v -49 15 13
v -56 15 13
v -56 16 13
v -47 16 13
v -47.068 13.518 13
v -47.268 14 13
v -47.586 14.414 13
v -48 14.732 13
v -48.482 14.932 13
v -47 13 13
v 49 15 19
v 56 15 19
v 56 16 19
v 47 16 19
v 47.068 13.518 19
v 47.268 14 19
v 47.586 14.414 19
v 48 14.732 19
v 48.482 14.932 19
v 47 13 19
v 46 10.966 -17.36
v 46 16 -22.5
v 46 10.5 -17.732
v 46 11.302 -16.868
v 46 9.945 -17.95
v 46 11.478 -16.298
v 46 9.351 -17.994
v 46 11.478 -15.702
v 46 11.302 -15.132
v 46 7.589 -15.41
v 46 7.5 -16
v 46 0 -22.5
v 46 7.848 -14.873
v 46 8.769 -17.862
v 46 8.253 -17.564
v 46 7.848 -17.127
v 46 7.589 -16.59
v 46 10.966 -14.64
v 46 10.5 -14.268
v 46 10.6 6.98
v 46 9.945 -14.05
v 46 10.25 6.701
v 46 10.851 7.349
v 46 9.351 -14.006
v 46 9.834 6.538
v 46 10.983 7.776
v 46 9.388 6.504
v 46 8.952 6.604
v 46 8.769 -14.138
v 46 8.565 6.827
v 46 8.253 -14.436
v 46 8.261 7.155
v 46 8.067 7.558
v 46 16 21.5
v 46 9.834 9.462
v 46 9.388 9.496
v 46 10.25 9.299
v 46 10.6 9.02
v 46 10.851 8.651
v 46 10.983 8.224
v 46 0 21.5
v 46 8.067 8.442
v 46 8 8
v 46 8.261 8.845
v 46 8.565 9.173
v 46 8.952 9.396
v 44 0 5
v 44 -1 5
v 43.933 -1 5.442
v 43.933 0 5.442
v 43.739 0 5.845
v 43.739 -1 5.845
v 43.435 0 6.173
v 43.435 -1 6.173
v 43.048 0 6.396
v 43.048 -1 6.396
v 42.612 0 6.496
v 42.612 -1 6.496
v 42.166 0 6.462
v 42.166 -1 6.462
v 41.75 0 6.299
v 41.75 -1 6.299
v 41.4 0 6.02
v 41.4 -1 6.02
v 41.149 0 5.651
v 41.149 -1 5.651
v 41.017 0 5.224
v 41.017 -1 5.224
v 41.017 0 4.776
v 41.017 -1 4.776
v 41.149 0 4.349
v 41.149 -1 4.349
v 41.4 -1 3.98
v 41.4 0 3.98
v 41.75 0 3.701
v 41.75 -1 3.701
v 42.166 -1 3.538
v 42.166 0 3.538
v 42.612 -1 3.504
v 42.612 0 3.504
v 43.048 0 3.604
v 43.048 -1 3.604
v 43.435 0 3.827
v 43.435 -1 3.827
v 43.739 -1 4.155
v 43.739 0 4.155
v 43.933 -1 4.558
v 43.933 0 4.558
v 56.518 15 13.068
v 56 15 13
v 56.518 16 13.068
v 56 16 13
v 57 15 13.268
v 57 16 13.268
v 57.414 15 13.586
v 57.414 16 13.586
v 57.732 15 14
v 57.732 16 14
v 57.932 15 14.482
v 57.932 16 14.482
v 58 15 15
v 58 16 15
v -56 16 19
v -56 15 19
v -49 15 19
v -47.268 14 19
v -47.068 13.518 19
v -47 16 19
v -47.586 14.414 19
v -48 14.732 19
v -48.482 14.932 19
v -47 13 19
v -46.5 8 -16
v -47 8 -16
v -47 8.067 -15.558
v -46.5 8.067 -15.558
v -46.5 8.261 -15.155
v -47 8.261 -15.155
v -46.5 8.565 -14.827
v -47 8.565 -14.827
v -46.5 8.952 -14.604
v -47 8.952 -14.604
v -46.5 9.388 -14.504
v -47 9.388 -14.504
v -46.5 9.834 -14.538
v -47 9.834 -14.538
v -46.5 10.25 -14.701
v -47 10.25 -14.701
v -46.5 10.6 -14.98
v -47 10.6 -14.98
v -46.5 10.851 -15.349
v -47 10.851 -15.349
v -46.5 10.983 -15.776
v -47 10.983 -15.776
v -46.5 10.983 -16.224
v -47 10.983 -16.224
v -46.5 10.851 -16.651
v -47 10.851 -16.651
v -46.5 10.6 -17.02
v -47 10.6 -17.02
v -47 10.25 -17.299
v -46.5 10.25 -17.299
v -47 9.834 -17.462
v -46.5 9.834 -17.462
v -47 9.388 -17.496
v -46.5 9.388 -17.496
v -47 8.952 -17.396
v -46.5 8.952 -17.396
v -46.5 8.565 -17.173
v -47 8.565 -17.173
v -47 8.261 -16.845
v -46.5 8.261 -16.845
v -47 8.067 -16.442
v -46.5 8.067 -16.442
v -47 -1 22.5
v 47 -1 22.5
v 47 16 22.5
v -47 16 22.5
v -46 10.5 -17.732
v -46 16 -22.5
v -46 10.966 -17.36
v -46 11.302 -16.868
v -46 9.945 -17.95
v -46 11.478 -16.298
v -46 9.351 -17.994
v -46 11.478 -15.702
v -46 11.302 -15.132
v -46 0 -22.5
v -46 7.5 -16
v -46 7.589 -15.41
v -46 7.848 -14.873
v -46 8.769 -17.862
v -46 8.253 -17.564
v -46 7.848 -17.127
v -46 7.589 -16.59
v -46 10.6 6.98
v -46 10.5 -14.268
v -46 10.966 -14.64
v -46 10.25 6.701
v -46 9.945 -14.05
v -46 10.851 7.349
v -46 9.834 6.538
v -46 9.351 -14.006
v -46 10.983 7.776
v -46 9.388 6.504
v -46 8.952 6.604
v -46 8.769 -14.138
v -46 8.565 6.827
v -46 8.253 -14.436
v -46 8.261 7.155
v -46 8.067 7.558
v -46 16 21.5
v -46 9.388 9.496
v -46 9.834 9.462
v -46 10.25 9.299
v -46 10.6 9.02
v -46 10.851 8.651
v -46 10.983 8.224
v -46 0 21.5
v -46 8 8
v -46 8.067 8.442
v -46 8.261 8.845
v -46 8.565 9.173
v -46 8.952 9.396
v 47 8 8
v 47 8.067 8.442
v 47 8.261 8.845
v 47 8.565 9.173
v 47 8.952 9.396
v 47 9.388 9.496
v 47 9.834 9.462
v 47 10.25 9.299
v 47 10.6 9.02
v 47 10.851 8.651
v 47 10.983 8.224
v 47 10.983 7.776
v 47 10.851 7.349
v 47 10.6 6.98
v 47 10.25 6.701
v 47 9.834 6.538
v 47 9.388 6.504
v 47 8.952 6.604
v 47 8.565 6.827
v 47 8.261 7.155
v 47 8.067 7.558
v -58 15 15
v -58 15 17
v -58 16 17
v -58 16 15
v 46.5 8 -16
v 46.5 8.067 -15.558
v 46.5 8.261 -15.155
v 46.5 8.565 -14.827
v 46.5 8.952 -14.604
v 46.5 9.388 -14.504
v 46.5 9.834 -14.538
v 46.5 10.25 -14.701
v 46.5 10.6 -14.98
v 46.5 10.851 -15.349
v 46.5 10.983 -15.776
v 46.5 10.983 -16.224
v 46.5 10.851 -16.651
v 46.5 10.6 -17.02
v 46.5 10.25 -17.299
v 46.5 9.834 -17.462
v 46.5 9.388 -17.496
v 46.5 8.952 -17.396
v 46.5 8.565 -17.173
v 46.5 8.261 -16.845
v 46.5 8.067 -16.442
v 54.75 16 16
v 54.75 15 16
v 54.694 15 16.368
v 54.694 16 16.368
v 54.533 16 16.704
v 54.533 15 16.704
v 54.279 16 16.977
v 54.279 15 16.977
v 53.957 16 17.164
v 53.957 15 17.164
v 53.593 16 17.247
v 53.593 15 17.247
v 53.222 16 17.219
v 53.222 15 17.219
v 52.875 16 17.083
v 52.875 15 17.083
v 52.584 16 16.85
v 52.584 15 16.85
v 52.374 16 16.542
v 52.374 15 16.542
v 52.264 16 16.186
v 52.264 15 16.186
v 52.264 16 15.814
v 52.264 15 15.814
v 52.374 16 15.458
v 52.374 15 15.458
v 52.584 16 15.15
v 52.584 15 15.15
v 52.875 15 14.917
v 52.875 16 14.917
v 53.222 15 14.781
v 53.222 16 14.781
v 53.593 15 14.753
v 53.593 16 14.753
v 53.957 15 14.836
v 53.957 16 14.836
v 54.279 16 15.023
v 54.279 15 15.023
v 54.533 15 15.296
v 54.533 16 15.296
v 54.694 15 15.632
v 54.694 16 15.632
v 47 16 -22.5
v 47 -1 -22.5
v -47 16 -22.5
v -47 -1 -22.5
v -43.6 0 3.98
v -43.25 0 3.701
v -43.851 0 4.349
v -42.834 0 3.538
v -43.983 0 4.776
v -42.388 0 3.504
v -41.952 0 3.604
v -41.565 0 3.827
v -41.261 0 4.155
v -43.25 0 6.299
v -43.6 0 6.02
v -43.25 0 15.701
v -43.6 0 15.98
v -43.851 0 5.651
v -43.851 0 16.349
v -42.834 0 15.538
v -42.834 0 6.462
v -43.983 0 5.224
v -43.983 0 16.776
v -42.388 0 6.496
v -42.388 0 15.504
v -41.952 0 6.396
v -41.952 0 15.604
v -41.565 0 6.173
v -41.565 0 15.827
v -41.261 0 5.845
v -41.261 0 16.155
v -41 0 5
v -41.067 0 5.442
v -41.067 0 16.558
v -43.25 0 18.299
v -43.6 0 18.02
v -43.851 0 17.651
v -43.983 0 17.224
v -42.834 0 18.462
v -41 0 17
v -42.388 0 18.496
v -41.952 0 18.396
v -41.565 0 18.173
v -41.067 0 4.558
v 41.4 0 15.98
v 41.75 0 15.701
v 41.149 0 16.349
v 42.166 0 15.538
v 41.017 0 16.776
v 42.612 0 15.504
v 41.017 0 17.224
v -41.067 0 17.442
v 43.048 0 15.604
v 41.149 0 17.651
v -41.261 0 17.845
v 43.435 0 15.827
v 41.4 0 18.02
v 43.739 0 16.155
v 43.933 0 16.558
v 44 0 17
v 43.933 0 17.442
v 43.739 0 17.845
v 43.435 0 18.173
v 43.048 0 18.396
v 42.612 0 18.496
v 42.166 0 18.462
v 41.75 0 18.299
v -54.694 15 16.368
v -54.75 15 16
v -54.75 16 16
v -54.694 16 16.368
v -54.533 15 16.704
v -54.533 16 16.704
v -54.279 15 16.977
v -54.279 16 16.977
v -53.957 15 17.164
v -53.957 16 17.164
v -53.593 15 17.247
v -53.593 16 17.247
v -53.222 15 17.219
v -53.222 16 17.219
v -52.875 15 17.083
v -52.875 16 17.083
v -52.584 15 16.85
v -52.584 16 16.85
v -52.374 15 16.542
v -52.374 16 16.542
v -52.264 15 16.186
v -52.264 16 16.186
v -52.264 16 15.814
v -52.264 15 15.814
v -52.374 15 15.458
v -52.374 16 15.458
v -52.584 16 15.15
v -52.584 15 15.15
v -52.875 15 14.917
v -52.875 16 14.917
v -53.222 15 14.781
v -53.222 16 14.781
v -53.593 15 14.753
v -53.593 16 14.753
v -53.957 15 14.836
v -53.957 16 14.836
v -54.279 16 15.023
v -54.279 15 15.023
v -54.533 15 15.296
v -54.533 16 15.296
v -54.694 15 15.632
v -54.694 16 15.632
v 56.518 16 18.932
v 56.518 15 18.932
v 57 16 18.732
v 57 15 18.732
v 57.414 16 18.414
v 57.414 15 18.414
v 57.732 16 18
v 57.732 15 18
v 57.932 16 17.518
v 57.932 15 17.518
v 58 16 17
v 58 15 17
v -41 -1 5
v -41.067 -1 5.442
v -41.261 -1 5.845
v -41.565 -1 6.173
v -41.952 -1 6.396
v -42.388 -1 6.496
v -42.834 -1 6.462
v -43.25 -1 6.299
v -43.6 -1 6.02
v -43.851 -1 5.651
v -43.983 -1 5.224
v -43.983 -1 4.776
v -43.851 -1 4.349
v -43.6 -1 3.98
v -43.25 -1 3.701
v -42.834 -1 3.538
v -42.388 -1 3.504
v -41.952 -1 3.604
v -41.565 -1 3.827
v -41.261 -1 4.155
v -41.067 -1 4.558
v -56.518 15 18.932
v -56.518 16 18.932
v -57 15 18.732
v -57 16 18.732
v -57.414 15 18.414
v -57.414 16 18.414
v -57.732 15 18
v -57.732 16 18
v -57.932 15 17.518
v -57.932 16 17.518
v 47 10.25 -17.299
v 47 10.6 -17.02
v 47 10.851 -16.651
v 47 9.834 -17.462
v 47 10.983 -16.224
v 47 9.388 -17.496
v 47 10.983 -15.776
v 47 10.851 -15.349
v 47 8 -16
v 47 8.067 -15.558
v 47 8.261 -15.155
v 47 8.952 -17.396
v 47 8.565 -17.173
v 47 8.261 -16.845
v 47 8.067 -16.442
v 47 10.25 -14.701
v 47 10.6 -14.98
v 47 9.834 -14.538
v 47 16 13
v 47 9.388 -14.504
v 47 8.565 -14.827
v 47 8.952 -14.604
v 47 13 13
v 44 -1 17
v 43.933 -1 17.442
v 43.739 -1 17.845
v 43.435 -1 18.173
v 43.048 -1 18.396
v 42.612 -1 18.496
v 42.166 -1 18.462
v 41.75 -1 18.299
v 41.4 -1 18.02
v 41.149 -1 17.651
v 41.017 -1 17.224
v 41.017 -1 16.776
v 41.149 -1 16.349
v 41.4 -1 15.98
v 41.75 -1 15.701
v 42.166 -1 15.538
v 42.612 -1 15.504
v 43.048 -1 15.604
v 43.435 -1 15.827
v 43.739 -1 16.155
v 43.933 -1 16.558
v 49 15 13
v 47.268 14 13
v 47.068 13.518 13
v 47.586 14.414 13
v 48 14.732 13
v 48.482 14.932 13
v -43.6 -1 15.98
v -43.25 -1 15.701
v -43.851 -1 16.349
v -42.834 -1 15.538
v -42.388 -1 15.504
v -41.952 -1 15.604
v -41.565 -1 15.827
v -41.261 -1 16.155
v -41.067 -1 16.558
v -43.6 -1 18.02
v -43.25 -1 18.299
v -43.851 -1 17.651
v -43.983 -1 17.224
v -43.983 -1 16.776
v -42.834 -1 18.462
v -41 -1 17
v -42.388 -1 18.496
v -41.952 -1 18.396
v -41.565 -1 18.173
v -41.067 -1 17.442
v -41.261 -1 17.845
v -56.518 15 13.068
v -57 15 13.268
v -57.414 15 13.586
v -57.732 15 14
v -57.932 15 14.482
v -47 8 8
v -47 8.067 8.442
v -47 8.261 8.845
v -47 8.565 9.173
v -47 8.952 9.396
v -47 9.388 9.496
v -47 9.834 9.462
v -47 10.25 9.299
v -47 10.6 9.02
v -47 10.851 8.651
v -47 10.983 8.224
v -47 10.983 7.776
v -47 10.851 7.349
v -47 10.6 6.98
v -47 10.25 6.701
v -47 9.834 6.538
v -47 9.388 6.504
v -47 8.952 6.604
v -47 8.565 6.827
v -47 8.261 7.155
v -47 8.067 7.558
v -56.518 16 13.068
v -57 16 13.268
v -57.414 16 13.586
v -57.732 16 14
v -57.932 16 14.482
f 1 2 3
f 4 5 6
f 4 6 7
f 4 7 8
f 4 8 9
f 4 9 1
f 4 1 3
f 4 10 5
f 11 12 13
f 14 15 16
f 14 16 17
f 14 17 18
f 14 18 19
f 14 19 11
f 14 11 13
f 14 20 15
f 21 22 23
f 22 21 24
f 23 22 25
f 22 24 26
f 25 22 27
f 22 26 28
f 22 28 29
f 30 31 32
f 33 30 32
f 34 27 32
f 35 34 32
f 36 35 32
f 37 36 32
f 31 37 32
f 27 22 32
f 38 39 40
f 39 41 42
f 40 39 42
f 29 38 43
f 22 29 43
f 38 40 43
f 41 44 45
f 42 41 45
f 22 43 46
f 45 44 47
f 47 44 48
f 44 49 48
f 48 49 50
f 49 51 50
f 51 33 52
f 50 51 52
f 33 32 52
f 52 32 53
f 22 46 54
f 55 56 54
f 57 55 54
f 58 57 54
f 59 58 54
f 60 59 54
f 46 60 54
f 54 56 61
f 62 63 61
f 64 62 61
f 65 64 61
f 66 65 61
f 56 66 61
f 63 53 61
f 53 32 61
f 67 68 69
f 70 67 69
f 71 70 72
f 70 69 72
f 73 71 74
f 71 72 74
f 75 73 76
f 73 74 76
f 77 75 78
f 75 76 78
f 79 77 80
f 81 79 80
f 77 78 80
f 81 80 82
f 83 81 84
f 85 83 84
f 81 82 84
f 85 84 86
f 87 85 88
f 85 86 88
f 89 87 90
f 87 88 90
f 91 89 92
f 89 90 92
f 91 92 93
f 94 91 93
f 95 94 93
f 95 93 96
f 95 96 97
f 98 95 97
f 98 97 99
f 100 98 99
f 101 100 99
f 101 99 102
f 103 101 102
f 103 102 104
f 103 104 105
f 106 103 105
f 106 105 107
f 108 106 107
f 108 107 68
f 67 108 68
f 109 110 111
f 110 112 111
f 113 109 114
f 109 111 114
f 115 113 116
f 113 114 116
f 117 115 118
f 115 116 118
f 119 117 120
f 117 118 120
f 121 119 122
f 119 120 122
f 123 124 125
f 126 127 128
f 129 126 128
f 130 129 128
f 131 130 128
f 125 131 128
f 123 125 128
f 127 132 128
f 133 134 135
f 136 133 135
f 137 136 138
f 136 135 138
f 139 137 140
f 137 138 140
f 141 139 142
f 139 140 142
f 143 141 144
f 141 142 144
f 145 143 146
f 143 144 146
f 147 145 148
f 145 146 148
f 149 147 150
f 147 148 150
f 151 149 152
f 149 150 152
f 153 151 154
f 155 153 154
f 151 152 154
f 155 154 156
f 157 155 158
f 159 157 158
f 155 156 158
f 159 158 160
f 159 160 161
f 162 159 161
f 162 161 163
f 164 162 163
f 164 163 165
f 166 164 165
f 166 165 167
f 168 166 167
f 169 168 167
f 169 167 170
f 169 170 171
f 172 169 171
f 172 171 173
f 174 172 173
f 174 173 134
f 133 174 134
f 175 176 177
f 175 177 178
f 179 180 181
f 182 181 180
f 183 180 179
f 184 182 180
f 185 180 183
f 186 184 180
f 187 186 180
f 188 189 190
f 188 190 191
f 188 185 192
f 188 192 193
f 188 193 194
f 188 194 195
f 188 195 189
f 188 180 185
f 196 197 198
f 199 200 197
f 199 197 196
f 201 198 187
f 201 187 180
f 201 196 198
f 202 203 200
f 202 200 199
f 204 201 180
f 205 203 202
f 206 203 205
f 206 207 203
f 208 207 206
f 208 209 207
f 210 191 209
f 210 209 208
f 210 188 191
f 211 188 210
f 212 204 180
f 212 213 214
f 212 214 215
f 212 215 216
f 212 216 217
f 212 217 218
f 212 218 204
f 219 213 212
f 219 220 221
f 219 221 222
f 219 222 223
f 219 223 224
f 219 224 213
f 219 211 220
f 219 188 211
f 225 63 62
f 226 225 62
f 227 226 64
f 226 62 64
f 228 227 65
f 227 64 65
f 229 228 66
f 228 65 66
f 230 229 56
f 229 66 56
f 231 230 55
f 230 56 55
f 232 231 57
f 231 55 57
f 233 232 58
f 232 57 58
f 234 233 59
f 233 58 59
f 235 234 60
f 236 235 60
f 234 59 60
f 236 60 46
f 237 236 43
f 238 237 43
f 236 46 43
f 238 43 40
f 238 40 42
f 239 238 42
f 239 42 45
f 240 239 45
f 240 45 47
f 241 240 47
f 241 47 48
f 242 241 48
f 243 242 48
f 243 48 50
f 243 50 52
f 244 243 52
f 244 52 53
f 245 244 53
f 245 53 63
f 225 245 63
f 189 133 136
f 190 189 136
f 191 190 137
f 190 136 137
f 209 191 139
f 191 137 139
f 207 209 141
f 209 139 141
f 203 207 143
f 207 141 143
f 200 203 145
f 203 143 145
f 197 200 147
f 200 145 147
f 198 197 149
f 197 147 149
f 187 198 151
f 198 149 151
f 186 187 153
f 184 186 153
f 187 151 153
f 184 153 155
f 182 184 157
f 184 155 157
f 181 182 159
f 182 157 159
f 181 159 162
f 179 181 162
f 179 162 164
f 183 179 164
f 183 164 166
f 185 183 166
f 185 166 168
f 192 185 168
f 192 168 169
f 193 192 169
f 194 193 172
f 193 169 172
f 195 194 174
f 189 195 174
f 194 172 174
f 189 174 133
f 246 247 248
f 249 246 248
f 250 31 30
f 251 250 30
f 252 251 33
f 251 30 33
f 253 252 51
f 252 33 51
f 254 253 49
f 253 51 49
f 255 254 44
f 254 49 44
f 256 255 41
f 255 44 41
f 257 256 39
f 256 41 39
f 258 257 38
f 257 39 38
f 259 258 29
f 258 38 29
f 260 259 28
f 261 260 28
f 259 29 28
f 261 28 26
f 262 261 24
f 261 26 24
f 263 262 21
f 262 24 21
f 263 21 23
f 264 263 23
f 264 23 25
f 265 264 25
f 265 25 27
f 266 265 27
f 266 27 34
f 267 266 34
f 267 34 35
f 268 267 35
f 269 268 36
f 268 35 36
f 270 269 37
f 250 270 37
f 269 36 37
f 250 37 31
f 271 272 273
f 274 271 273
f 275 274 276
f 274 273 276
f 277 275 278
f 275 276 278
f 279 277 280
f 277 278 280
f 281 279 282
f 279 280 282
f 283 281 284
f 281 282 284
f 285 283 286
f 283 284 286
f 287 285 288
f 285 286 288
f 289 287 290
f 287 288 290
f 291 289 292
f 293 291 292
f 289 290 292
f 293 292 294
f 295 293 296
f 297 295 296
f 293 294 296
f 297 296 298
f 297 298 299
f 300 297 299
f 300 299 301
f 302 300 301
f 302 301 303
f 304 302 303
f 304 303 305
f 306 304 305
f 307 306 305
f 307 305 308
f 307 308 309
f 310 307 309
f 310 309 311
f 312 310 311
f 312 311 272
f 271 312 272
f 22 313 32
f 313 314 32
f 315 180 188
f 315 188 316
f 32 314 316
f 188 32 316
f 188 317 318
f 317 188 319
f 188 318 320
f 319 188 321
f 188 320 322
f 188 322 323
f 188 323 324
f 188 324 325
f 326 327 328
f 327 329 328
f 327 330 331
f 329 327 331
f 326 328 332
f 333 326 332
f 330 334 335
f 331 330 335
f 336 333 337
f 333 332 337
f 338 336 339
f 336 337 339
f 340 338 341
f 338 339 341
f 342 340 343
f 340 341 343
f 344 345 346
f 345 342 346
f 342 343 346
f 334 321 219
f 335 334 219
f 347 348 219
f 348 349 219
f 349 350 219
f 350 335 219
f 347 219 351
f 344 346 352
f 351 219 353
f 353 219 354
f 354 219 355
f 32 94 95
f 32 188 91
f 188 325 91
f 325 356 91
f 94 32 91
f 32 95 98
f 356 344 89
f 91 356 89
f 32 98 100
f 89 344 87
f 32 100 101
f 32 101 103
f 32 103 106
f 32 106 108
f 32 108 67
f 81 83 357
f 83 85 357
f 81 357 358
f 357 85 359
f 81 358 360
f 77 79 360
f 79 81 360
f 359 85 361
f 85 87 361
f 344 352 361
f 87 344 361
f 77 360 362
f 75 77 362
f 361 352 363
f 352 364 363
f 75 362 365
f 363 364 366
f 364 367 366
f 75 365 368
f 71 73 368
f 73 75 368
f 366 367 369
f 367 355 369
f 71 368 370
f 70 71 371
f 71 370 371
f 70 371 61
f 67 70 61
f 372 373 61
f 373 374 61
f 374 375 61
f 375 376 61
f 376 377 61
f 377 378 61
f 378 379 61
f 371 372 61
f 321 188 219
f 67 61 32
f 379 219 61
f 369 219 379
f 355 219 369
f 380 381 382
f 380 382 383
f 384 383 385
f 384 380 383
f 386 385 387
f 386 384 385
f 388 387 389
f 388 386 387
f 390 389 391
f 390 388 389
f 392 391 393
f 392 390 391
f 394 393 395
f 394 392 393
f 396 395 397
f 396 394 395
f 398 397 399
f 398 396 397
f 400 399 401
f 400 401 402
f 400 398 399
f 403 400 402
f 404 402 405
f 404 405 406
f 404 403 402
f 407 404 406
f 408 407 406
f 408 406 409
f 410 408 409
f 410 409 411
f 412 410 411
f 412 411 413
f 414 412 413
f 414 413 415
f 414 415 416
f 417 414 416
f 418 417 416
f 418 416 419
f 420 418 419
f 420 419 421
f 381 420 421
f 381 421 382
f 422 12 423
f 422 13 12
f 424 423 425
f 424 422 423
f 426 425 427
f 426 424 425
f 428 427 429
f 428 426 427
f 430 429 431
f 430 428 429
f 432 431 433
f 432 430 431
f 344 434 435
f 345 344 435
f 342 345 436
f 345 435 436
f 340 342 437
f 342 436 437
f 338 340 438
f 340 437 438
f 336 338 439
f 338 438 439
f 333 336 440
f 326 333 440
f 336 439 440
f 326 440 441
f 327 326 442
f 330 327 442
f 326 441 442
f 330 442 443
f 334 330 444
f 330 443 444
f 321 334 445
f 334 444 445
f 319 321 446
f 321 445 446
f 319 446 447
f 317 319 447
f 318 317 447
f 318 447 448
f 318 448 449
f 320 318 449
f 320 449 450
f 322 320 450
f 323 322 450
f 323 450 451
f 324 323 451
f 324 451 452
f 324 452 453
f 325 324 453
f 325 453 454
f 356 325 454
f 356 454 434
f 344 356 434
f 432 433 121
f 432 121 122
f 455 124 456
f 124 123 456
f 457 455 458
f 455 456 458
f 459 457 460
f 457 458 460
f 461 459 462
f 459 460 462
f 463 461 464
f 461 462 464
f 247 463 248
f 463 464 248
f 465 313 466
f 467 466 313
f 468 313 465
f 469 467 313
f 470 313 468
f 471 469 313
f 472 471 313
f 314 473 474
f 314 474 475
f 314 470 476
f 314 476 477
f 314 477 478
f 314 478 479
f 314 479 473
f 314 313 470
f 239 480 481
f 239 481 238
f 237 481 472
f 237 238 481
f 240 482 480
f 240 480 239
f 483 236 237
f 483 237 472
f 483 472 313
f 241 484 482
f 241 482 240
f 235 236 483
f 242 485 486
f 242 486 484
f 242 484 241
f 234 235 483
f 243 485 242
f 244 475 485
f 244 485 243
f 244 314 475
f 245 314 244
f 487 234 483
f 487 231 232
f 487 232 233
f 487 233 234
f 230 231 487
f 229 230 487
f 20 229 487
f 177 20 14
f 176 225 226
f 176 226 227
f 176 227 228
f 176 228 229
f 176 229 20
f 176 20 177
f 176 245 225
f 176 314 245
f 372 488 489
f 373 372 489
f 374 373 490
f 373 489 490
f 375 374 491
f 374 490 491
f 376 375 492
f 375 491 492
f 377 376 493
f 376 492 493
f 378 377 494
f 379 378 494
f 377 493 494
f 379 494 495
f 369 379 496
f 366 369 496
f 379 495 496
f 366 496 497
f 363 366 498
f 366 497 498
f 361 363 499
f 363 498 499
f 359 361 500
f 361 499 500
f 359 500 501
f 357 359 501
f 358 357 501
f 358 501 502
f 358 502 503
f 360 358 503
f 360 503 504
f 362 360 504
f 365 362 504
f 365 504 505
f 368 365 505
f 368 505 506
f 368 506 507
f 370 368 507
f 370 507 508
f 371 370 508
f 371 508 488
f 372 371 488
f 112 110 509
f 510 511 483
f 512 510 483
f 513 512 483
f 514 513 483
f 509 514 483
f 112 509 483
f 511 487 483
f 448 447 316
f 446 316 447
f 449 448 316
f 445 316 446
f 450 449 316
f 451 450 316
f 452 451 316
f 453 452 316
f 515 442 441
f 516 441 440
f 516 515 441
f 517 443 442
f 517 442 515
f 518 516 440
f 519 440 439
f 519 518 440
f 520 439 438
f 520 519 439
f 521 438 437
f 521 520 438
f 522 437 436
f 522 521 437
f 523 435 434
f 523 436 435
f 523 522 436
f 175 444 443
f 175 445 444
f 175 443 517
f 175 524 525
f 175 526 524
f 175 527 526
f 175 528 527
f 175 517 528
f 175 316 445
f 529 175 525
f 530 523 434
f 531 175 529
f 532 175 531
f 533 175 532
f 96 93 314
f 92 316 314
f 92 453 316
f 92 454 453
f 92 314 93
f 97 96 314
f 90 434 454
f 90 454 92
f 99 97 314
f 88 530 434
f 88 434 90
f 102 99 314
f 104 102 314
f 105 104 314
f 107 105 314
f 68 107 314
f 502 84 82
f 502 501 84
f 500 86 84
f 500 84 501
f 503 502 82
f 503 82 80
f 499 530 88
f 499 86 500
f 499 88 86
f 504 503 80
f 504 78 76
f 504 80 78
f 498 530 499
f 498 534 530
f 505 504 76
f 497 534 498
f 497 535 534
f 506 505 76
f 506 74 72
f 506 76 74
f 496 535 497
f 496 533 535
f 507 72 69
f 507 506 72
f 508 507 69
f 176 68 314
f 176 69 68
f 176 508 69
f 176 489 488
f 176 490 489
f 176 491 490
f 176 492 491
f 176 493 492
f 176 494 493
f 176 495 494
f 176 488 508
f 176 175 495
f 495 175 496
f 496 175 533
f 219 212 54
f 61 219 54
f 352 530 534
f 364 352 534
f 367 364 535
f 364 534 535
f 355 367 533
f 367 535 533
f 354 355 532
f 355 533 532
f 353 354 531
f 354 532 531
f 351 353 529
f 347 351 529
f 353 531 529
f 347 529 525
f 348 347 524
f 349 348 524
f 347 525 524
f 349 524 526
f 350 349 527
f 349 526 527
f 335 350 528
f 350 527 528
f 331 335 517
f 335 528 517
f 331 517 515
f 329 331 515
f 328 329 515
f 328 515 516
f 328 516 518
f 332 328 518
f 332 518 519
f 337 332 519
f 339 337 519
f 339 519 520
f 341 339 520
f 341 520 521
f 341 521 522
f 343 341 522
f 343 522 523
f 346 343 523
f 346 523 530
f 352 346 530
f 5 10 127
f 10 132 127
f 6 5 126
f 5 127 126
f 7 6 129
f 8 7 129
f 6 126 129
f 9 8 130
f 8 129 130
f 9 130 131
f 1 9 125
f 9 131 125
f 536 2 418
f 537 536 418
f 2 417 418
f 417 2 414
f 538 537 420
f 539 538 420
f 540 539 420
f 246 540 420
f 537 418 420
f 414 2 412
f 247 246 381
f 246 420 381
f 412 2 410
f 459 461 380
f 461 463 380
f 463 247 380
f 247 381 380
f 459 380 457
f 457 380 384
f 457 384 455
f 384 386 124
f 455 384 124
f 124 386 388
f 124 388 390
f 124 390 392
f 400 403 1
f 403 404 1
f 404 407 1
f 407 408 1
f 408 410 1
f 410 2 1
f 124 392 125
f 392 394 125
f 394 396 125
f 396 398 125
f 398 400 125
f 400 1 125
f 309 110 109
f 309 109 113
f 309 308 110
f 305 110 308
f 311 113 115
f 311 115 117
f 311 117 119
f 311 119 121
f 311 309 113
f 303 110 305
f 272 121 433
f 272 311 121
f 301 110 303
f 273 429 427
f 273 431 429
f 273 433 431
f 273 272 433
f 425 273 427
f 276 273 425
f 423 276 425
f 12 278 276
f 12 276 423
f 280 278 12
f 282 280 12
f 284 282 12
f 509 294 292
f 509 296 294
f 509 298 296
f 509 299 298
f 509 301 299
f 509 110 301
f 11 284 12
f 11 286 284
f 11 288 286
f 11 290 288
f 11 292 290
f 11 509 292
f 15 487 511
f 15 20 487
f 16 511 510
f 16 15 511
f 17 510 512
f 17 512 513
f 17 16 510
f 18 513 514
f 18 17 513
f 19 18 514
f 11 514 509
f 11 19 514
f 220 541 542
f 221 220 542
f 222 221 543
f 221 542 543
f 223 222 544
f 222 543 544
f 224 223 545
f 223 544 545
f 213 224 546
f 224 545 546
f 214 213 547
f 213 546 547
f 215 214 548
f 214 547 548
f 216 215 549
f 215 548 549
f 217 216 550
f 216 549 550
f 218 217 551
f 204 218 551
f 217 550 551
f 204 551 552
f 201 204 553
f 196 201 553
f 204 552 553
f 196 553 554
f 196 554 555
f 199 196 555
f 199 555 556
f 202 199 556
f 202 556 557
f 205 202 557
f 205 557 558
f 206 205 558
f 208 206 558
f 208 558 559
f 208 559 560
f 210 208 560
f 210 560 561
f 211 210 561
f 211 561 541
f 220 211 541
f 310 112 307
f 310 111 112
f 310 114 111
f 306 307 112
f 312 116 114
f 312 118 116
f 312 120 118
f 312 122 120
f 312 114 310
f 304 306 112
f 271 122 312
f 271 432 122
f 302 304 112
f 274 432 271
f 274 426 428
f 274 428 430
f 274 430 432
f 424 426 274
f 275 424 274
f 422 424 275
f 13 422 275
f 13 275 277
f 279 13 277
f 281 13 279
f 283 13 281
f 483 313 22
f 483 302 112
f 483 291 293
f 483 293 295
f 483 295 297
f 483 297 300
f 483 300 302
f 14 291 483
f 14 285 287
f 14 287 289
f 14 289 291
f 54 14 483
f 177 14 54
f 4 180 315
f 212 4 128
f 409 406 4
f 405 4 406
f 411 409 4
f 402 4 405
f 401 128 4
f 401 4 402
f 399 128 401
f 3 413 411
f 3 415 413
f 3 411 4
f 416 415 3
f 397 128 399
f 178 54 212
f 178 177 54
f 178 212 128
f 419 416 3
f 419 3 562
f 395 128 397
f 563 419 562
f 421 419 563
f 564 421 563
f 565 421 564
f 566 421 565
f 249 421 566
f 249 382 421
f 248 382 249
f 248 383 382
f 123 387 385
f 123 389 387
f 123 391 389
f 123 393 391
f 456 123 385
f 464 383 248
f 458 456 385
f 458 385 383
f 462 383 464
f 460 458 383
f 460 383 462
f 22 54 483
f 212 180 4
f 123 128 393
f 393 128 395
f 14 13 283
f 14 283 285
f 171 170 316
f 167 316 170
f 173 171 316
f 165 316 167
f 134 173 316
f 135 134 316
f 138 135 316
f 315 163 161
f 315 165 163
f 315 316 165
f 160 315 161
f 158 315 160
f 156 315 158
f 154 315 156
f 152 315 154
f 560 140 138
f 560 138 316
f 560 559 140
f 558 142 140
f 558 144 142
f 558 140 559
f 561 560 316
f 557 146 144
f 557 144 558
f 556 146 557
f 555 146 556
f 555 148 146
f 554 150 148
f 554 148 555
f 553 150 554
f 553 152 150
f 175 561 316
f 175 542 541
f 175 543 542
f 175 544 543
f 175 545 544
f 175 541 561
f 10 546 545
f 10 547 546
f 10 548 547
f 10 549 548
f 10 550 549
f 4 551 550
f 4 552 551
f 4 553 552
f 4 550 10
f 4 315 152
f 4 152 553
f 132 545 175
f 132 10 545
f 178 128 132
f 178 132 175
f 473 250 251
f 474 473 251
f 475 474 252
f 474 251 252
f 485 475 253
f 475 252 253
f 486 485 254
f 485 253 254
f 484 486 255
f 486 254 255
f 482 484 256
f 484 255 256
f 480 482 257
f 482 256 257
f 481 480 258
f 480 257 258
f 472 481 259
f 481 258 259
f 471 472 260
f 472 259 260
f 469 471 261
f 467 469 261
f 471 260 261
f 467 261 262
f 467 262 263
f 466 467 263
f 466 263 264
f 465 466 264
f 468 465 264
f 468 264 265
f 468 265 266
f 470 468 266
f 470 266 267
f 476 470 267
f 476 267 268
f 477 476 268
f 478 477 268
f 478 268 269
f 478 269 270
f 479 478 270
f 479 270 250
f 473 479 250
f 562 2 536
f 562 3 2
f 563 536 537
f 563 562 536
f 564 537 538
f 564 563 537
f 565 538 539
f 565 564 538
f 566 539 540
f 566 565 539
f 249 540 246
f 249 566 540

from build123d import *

# Parameters (mm, degrees)
F0_W      = 94
F0_H      = 45
F1_DEPTH  = 1
F2_W      = 1
F2_H      = 45
F3_DEPTH  = 16
F4_W      = 94
F4_H      = 17
F5_DEPTH  = 1
F6_W      = 1
F6_H      = 6
F7_DEPTH  = 11
F8_R      = 1.25
F8_R_2    = 1.5
F9_DEPTH  = 25
F10_R     = 2
F12_W     = 19.2678107619
F12_H     = 14.8564111814
F12_W_2   = 16.8835728168
F12_H_2   = 15.2771589719
F13_DEPTH = 25
F14_R     = 1.5
F15_DEPTH = 100
F16_SIZE  = 0.5
F17_R     = 1.5
F18_DEPTH = 100
F19_R     = 1.5
F20_DEPTH = 25


with BuildPart() as f1:
    # F0 (on Front) → F1 (new body)
    with BuildSketch(Plane.XZ):
        Rectangle(F0_W, F0_H)
    extrude(amount=F1_DEPTH)

    # F2 (on face) → F3 (join)
    with BuildSketch(Plane(origin=(0, 0, 0), x_dir=(-1, 0, 0), z_dir=(0, 1, 0))):
        with Locations((-46.5, 0)):
            Rectangle(F2_W, F2_H)
        with Locations((46.5, 0)):
            Rectangle(F2_W, F2_H)
    extrude(amount=F3_DEPTH)

    # F4 (on face) → F5 (join)
    with BuildSketch(Plane.XY.offset(22.5)):
        with Locations((0, 7.5)):
            Rectangle(F4_W, F4_H)
    extrude(amount=-F5_DEPTH)

    # F6 (on face) → F7 (join)
    with BuildSketch(Plane.YZ.offset(47)):
        with Locations((15.5, 16)):
            Rectangle(F6_W, F6_H)
        with Locations((15.5, -16)):
            Rectangle(F6_W, F6_H)
    extrude(amount=F7_DEPTH)

    # F8 (on face) → F9 (cut)
    with BuildSketch(Plane.XZ.offset(-15)):
        with Locations((53.5, 16)):
            Circle(F8_R)
        with Locations((53.5, -16)):
            Circle(F8_R_2)
    extrude(amount=-F9_DEPTH, mode=Mode.SUBTRACT)

    # F10
    f10_edges = [f1.edges().sort_by_distance(p)[0] for p in [
        (58, 15.5, -19),
        (58, 15.5, -13),
        (58, 15.5, 19),
        (58, 15.5, 13),
        (47, 15, -16),
        (47, 15, 16),
    ]]
    fillet(f10_edges, radius=F10_R)

    # F11: F1 across plane


with BuildPart() as f1_1:
    add(f1.part)
    add(f1.part.mirror(Plane.YZ))

    # F12 (on face) → F13 (cut)
    with BuildSketch(Plane.XZ.offset(1)):
        with Locations((56.633905381, -15.0717944093)):
            Rectangle(F12_W, F12_H)
        with Locations((-55.4417864084, -14.8614205141)):
            Rectangle(F12_W_2, F12_H_2)
    extrude(amount=-F13_DEPTH, mode=Mode.SUBTRACT)

    # F14 (on face) → F15 (cut)
    with BuildSketch(Plane(origin=(-47, 0, 0), x_dir=(0, -1, 0), z_dir=(-1, 0, 0))):
        with Locations((-9.5, -16)):
            Circle(F14_R)
    extrude(amount=-F15_DEPTH, mode=Mode.SUBTRACT)

    # F16
    f16_edges = [f1_1.edges().sort_by_distance(p)[0] for p in [
        (-46, 11, -16),
        (46, 11, -16),
    ]]
    chamfer(f16_edges, length=F16_SIZE)

    # F17 (on face) → F18 (cut)
    with BuildSketch(Plane(origin=(-47, 0, 0), x_dir=(0, -1, 0), z_dir=(-1, 0, 0))):
        with Locations((-9.5, 8)):
            Circle(F17_R)
    extrude(amount=-F18_DEPTH, mode=Mode.SUBTRACT)

    # F19 (on face) → F20 (cut)
    with BuildSketch(Plane.XZ.offset(1)):
        with Locations((-42.5, 17)):
            Circle(F19_R)
        with Locations((42.5, 17)):
            Circle(F19_R)
        with Locations((-42.5, 5)):
            Circle(F19_R)
        with Locations((42.5, 5)):
            Circle(F19_R)
    extrude(amount=-F20_DEPTH, mode=Mode.SUBTRACT)


solid = f1_1.part
